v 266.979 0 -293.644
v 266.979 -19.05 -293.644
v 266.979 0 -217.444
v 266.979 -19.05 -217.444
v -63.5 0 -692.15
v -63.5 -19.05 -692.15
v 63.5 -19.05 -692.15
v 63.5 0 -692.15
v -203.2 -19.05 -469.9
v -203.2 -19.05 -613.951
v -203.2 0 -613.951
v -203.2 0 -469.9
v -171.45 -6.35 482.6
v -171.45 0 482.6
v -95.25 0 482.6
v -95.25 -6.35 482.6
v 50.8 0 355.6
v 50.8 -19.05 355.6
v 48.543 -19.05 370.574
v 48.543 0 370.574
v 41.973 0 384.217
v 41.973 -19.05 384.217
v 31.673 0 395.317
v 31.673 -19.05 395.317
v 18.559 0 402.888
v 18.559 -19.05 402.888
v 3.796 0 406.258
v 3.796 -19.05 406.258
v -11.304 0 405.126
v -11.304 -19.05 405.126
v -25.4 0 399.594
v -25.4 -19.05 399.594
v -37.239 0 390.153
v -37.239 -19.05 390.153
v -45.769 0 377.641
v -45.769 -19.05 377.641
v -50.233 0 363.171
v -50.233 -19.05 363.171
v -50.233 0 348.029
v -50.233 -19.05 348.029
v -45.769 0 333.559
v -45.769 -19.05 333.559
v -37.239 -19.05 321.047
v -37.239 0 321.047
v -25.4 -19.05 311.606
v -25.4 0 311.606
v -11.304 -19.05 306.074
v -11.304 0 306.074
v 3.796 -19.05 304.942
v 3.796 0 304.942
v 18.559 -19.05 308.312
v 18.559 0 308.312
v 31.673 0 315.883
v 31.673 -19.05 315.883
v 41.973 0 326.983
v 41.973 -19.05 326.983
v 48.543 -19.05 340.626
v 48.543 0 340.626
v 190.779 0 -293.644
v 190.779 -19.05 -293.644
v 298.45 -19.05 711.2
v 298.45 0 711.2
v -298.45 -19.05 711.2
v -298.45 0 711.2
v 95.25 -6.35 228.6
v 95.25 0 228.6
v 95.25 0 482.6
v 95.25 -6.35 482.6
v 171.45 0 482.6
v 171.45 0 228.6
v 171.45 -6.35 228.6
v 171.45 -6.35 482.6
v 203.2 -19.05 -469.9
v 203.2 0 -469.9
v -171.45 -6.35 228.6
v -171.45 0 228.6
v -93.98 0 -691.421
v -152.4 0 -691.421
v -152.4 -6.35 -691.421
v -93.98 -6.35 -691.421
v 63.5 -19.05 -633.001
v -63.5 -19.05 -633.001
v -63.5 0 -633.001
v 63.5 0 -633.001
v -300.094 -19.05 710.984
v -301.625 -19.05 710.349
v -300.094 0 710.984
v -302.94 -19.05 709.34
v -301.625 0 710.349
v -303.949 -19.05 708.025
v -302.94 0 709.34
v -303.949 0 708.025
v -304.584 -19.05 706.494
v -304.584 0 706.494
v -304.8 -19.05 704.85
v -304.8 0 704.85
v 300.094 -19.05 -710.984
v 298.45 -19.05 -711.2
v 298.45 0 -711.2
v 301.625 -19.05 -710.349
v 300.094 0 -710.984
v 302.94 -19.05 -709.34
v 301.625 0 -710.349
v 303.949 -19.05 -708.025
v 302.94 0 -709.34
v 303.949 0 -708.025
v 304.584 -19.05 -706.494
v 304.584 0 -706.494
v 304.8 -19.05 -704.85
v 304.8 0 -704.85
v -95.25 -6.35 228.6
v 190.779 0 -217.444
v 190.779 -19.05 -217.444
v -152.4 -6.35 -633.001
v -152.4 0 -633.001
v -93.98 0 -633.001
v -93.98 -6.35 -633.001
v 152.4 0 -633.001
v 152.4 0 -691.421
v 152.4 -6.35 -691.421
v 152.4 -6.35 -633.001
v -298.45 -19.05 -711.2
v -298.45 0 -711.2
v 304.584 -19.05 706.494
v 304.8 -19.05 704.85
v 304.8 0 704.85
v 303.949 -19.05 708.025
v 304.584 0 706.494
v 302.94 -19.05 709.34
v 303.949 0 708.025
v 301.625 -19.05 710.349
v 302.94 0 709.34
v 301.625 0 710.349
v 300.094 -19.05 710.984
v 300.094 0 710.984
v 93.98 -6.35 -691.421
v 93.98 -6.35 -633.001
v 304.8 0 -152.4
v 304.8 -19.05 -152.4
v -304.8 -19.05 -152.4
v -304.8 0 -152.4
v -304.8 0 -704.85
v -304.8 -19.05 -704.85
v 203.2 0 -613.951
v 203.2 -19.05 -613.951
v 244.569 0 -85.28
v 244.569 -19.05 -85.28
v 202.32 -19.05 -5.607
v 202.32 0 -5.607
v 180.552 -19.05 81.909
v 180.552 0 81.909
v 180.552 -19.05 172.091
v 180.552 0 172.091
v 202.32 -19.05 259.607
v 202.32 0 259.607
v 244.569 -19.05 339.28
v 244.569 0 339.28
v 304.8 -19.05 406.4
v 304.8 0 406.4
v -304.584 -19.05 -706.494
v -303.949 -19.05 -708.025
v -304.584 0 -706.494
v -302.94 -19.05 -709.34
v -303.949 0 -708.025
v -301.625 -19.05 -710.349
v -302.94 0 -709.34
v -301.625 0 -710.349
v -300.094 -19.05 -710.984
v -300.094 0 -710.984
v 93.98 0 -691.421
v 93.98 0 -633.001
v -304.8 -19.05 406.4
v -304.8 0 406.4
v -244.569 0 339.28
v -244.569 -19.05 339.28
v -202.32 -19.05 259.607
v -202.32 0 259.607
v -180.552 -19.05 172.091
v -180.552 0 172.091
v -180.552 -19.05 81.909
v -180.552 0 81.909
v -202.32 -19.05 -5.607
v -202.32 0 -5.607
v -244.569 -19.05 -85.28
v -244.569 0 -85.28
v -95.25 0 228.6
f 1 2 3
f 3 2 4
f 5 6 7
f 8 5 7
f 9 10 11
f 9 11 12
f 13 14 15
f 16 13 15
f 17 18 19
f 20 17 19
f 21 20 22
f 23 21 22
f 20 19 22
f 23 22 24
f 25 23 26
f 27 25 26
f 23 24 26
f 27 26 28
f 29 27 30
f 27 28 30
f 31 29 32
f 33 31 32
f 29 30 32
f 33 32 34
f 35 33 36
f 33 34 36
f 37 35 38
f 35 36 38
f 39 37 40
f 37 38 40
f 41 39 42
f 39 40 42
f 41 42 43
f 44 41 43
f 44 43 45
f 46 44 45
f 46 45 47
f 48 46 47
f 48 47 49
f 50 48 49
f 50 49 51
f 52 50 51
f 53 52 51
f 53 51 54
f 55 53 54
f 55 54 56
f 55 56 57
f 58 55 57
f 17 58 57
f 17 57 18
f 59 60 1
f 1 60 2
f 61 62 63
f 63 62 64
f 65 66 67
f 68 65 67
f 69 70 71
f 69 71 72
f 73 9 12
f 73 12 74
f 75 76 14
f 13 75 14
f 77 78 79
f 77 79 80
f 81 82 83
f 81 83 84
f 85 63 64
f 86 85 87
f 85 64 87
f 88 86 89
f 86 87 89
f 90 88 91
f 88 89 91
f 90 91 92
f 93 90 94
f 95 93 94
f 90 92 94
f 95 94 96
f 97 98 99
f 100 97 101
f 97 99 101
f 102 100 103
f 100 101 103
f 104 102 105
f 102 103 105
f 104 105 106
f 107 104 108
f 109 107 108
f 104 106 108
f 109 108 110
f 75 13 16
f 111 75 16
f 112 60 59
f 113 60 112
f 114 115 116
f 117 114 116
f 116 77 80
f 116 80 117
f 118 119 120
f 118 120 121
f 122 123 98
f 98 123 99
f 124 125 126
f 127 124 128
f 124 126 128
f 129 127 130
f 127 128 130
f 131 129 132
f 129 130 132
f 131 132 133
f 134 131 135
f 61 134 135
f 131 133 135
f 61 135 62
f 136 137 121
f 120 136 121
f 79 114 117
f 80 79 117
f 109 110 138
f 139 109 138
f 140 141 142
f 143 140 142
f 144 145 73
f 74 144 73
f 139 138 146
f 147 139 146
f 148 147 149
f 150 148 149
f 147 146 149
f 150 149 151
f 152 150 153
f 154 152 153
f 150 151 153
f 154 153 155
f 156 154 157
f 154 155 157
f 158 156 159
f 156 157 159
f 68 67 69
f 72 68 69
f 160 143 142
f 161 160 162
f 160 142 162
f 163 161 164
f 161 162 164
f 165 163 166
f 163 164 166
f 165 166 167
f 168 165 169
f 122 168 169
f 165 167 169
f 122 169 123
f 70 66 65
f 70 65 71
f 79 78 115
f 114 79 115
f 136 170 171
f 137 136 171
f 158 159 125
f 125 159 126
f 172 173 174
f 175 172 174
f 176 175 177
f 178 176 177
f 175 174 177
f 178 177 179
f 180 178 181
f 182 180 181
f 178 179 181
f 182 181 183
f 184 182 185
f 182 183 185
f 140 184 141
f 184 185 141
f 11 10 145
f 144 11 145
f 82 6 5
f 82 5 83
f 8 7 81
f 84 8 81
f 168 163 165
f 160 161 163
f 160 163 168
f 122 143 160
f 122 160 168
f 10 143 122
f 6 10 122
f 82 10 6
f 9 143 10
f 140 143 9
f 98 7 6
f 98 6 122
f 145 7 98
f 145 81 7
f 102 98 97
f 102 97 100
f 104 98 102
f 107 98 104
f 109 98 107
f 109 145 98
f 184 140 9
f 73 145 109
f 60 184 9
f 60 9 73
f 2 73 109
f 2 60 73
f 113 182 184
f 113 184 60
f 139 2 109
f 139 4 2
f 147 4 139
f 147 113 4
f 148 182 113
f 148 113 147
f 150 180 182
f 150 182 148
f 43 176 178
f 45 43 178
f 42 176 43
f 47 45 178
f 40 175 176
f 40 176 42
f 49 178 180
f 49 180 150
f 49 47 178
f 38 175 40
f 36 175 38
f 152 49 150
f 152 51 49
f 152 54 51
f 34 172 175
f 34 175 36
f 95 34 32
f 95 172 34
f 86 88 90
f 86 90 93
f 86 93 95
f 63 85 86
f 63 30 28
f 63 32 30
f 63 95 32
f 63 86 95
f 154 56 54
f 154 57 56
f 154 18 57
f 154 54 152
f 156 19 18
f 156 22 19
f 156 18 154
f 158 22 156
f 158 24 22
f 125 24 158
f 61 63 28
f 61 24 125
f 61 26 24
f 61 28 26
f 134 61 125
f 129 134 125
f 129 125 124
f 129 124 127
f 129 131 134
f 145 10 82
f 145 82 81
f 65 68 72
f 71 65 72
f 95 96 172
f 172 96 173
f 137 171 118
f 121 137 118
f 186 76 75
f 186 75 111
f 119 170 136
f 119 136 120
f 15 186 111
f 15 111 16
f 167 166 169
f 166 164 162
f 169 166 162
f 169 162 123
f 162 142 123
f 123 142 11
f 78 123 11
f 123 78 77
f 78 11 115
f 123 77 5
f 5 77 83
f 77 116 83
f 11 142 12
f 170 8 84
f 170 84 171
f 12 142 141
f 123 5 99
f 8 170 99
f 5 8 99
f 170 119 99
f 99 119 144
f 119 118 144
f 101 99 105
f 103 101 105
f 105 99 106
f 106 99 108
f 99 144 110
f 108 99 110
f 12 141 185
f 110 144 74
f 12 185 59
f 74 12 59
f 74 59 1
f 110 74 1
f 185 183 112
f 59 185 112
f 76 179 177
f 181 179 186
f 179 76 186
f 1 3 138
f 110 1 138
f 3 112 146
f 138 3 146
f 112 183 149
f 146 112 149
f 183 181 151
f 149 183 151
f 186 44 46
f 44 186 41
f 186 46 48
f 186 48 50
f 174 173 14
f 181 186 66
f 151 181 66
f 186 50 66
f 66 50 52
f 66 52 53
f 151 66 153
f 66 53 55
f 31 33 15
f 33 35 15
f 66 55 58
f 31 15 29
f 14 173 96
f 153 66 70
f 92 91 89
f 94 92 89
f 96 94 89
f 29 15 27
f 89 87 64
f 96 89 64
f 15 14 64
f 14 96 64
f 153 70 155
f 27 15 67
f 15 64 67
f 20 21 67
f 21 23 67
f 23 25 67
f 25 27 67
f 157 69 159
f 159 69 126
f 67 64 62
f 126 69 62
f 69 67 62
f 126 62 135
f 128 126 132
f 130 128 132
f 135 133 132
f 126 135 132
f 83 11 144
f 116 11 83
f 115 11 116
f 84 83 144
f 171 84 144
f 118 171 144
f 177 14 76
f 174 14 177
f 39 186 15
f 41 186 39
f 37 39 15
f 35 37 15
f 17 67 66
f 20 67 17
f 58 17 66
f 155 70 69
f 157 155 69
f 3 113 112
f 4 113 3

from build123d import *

# Parameters (mm, degrees)
F1_DEPTH = 19.05
F2_R     = 50.8
F2_W     = 76.2
F2_H     = 76.2
F2_W_2   = 406.4
F2_H_2   = 144.050563
F3_DEPTH = 19.051
F4_W     = 58.42
F4_H     = 58.42
F4_W_2   = 76.2
F4_H_2   = 254
F5_DEPTH = 6.35
F2_W_3   = 127
F2_H_3   = 59.149437
F6_DEPTH = 19.051


with BuildPart() as f1:
    # F0 (on Front) → F1 (new body)
    with BuildSketch(Plane.XZ):
        with BuildLine():
            Line((298.45, 711.2), (-298.45, 711.2))
            ThreePointArc((-298.45, 711.2), (-302.940128, 709.340128), (-304.8, 704.85))
            Line((-304.8, 704.85), (-304.8, 406.4))
            ThreePointArc((-304.8, 406.4), (-177.8, 127), (-304.8, -152.4))
            Line((-304.8, -152.4), (-304.8, -704.85))
            ThreePointArc((-304.8, -704.85), (-302.940128, -709.340128), (-298.45, -711.2))
            Line((-298.45, -711.2), (298.45, -711.2))
            ThreePointArc((298.45, -711.2), (302.940128, -709.340128), (304.8, -704.85))
            Line((304.8, -704.85), (304.8, -152.4))
            ThreePointArc((304.8, -152.4), (177.8, 127), (304.8, 406.4))
            Line((304.8, 406.4), (304.8, 704.85))
            ThreePointArc((304.8, 704.85), (302.940128, 709.340128), (298.45, 711.2))
        make_face()
    extrude(amount=F1_DEPTH)

    # F2 (on face) → F3 (cut, through all)
    with BuildSketch(Plane.XZ.offset(19.05)):
        with Locations((0, 355.6)):
            Circle(F2_R)
        with Locations((228.878711, -255.543973)):
            Rectangle(F2_W, F2_H)
        with Locations((0, -541.925281)):
            Rectangle(F2_W_2, F2_H_2)
    extrude(amount=-F3_DEPTH, mode=Mode.SUBTRACT)

    # F4 (on face) → F5 (cut)
    with BuildSketch(Plane.XZ):
        with Locations((123.19, -662.210563)):
            Rectangle(F4_W, F4_H)
        with Locations((-123.19, -662.210563)):
            Rectangle(F4_W, F4_H)
        with Locations((133.35, 355.6)):
            Rectangle(F4_W_2, F4_H_2)
        with Locations((-133.35, 355.6)):
            Rectangle(F4_W_2, F4_H_2)
    extrude(amount=F5_DEPTH, mode=Mode.SUBTRACT)

    # F2 (on face) → F6 (cut, through all)
    with BuildSketch(Plane.XZ.offset(19.05)):
        with Locations((0, -662.575281)):
            Rectangle(F2_W_3, F2_H_3)
    extrude(amount=-F6_DEPTH, mode=Mode.SUBTRACT)


solid = f1.part
